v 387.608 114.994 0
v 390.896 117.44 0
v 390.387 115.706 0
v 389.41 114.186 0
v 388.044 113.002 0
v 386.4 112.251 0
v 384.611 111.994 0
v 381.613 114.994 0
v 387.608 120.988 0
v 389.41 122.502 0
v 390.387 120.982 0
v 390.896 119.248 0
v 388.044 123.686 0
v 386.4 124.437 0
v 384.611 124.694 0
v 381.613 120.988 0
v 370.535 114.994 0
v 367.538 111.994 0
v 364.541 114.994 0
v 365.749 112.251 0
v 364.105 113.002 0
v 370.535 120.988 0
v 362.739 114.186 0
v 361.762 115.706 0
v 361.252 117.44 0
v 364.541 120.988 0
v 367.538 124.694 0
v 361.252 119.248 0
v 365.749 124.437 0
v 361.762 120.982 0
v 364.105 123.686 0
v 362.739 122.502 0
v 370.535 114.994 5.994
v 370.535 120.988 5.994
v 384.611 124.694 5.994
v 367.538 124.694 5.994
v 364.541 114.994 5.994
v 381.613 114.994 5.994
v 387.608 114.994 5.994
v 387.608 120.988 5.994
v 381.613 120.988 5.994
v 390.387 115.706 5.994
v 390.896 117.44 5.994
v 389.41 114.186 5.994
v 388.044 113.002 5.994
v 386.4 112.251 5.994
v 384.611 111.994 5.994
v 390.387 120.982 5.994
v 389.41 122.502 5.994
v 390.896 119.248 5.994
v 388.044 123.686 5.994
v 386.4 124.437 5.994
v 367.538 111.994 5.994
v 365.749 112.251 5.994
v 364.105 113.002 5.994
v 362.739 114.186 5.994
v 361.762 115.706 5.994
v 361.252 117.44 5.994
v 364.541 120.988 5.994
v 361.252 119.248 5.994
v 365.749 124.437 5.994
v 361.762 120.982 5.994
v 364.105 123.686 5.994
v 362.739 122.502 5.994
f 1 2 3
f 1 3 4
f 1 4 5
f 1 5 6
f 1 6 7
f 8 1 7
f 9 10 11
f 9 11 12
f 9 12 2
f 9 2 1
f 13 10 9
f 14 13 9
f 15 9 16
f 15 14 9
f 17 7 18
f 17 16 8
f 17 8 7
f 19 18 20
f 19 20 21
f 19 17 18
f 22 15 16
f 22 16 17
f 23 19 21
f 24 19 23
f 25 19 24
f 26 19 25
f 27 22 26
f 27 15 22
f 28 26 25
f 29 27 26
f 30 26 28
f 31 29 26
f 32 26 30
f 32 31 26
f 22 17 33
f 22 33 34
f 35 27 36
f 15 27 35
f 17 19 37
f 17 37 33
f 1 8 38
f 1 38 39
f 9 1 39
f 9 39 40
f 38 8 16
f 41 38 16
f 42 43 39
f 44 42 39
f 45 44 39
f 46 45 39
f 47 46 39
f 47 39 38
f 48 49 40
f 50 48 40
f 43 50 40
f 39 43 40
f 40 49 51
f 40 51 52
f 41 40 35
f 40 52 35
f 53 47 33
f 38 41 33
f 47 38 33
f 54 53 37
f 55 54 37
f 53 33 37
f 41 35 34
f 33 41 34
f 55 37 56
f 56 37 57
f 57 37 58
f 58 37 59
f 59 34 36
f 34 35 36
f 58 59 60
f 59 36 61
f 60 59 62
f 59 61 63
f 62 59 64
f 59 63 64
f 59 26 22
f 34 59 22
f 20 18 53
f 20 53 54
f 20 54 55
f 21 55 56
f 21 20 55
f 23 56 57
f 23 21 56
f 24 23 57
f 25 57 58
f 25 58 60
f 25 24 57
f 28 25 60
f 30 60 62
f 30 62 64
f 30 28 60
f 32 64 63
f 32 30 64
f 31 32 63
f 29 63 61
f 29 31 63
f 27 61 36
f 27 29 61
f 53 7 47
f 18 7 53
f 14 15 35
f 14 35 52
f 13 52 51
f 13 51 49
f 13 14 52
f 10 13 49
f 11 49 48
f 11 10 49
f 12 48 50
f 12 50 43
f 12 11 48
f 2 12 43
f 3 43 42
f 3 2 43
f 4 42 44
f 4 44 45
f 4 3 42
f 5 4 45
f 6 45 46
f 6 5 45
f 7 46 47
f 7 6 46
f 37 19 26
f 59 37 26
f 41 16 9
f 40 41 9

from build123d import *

# Parameters (mm, degrees)
SKETCH1_W           = 5.9944
SKETCH1_H           = 5.9944
BOSS_EXTRUDE1_DEPTH = 5.9944


with BuildPart() as part:
    # Sketch1 → Boss-Extrude1 (new body)
    with BuildSketch(Plane.XY):
        with BuildLine():
            Line((384.610540851, 111.993994152), (367.537765391, 111.993994152))
            ThreePointArc((367.537765391, 111.993994152), (361.187765391, 118.343994152), (367.537765391, 124.693994152))
            Line((367.537765391, 124.693994152), (384.610540851, 124.693994152))
            ThreePointArc((384.610540851, 124.693994152), (390.960540851, 118.343994152), (384.610540851, 111.993994152))
        make_face()
        with Locations((384.610540851, 117.991248441)):
            Rectangle(SKETCH1_W, SKETCH1_H, mode=Mode.SUBTRACT)
        with Locations((367.537765391, 117.991248441)):
            Rectangle(SKETCH1_W, SKETCH1_H, mode=Mode.SUBTRACT)
    extrude(amount=BOSS_EXTRUDE1_DEPTH)


solid = part.part
